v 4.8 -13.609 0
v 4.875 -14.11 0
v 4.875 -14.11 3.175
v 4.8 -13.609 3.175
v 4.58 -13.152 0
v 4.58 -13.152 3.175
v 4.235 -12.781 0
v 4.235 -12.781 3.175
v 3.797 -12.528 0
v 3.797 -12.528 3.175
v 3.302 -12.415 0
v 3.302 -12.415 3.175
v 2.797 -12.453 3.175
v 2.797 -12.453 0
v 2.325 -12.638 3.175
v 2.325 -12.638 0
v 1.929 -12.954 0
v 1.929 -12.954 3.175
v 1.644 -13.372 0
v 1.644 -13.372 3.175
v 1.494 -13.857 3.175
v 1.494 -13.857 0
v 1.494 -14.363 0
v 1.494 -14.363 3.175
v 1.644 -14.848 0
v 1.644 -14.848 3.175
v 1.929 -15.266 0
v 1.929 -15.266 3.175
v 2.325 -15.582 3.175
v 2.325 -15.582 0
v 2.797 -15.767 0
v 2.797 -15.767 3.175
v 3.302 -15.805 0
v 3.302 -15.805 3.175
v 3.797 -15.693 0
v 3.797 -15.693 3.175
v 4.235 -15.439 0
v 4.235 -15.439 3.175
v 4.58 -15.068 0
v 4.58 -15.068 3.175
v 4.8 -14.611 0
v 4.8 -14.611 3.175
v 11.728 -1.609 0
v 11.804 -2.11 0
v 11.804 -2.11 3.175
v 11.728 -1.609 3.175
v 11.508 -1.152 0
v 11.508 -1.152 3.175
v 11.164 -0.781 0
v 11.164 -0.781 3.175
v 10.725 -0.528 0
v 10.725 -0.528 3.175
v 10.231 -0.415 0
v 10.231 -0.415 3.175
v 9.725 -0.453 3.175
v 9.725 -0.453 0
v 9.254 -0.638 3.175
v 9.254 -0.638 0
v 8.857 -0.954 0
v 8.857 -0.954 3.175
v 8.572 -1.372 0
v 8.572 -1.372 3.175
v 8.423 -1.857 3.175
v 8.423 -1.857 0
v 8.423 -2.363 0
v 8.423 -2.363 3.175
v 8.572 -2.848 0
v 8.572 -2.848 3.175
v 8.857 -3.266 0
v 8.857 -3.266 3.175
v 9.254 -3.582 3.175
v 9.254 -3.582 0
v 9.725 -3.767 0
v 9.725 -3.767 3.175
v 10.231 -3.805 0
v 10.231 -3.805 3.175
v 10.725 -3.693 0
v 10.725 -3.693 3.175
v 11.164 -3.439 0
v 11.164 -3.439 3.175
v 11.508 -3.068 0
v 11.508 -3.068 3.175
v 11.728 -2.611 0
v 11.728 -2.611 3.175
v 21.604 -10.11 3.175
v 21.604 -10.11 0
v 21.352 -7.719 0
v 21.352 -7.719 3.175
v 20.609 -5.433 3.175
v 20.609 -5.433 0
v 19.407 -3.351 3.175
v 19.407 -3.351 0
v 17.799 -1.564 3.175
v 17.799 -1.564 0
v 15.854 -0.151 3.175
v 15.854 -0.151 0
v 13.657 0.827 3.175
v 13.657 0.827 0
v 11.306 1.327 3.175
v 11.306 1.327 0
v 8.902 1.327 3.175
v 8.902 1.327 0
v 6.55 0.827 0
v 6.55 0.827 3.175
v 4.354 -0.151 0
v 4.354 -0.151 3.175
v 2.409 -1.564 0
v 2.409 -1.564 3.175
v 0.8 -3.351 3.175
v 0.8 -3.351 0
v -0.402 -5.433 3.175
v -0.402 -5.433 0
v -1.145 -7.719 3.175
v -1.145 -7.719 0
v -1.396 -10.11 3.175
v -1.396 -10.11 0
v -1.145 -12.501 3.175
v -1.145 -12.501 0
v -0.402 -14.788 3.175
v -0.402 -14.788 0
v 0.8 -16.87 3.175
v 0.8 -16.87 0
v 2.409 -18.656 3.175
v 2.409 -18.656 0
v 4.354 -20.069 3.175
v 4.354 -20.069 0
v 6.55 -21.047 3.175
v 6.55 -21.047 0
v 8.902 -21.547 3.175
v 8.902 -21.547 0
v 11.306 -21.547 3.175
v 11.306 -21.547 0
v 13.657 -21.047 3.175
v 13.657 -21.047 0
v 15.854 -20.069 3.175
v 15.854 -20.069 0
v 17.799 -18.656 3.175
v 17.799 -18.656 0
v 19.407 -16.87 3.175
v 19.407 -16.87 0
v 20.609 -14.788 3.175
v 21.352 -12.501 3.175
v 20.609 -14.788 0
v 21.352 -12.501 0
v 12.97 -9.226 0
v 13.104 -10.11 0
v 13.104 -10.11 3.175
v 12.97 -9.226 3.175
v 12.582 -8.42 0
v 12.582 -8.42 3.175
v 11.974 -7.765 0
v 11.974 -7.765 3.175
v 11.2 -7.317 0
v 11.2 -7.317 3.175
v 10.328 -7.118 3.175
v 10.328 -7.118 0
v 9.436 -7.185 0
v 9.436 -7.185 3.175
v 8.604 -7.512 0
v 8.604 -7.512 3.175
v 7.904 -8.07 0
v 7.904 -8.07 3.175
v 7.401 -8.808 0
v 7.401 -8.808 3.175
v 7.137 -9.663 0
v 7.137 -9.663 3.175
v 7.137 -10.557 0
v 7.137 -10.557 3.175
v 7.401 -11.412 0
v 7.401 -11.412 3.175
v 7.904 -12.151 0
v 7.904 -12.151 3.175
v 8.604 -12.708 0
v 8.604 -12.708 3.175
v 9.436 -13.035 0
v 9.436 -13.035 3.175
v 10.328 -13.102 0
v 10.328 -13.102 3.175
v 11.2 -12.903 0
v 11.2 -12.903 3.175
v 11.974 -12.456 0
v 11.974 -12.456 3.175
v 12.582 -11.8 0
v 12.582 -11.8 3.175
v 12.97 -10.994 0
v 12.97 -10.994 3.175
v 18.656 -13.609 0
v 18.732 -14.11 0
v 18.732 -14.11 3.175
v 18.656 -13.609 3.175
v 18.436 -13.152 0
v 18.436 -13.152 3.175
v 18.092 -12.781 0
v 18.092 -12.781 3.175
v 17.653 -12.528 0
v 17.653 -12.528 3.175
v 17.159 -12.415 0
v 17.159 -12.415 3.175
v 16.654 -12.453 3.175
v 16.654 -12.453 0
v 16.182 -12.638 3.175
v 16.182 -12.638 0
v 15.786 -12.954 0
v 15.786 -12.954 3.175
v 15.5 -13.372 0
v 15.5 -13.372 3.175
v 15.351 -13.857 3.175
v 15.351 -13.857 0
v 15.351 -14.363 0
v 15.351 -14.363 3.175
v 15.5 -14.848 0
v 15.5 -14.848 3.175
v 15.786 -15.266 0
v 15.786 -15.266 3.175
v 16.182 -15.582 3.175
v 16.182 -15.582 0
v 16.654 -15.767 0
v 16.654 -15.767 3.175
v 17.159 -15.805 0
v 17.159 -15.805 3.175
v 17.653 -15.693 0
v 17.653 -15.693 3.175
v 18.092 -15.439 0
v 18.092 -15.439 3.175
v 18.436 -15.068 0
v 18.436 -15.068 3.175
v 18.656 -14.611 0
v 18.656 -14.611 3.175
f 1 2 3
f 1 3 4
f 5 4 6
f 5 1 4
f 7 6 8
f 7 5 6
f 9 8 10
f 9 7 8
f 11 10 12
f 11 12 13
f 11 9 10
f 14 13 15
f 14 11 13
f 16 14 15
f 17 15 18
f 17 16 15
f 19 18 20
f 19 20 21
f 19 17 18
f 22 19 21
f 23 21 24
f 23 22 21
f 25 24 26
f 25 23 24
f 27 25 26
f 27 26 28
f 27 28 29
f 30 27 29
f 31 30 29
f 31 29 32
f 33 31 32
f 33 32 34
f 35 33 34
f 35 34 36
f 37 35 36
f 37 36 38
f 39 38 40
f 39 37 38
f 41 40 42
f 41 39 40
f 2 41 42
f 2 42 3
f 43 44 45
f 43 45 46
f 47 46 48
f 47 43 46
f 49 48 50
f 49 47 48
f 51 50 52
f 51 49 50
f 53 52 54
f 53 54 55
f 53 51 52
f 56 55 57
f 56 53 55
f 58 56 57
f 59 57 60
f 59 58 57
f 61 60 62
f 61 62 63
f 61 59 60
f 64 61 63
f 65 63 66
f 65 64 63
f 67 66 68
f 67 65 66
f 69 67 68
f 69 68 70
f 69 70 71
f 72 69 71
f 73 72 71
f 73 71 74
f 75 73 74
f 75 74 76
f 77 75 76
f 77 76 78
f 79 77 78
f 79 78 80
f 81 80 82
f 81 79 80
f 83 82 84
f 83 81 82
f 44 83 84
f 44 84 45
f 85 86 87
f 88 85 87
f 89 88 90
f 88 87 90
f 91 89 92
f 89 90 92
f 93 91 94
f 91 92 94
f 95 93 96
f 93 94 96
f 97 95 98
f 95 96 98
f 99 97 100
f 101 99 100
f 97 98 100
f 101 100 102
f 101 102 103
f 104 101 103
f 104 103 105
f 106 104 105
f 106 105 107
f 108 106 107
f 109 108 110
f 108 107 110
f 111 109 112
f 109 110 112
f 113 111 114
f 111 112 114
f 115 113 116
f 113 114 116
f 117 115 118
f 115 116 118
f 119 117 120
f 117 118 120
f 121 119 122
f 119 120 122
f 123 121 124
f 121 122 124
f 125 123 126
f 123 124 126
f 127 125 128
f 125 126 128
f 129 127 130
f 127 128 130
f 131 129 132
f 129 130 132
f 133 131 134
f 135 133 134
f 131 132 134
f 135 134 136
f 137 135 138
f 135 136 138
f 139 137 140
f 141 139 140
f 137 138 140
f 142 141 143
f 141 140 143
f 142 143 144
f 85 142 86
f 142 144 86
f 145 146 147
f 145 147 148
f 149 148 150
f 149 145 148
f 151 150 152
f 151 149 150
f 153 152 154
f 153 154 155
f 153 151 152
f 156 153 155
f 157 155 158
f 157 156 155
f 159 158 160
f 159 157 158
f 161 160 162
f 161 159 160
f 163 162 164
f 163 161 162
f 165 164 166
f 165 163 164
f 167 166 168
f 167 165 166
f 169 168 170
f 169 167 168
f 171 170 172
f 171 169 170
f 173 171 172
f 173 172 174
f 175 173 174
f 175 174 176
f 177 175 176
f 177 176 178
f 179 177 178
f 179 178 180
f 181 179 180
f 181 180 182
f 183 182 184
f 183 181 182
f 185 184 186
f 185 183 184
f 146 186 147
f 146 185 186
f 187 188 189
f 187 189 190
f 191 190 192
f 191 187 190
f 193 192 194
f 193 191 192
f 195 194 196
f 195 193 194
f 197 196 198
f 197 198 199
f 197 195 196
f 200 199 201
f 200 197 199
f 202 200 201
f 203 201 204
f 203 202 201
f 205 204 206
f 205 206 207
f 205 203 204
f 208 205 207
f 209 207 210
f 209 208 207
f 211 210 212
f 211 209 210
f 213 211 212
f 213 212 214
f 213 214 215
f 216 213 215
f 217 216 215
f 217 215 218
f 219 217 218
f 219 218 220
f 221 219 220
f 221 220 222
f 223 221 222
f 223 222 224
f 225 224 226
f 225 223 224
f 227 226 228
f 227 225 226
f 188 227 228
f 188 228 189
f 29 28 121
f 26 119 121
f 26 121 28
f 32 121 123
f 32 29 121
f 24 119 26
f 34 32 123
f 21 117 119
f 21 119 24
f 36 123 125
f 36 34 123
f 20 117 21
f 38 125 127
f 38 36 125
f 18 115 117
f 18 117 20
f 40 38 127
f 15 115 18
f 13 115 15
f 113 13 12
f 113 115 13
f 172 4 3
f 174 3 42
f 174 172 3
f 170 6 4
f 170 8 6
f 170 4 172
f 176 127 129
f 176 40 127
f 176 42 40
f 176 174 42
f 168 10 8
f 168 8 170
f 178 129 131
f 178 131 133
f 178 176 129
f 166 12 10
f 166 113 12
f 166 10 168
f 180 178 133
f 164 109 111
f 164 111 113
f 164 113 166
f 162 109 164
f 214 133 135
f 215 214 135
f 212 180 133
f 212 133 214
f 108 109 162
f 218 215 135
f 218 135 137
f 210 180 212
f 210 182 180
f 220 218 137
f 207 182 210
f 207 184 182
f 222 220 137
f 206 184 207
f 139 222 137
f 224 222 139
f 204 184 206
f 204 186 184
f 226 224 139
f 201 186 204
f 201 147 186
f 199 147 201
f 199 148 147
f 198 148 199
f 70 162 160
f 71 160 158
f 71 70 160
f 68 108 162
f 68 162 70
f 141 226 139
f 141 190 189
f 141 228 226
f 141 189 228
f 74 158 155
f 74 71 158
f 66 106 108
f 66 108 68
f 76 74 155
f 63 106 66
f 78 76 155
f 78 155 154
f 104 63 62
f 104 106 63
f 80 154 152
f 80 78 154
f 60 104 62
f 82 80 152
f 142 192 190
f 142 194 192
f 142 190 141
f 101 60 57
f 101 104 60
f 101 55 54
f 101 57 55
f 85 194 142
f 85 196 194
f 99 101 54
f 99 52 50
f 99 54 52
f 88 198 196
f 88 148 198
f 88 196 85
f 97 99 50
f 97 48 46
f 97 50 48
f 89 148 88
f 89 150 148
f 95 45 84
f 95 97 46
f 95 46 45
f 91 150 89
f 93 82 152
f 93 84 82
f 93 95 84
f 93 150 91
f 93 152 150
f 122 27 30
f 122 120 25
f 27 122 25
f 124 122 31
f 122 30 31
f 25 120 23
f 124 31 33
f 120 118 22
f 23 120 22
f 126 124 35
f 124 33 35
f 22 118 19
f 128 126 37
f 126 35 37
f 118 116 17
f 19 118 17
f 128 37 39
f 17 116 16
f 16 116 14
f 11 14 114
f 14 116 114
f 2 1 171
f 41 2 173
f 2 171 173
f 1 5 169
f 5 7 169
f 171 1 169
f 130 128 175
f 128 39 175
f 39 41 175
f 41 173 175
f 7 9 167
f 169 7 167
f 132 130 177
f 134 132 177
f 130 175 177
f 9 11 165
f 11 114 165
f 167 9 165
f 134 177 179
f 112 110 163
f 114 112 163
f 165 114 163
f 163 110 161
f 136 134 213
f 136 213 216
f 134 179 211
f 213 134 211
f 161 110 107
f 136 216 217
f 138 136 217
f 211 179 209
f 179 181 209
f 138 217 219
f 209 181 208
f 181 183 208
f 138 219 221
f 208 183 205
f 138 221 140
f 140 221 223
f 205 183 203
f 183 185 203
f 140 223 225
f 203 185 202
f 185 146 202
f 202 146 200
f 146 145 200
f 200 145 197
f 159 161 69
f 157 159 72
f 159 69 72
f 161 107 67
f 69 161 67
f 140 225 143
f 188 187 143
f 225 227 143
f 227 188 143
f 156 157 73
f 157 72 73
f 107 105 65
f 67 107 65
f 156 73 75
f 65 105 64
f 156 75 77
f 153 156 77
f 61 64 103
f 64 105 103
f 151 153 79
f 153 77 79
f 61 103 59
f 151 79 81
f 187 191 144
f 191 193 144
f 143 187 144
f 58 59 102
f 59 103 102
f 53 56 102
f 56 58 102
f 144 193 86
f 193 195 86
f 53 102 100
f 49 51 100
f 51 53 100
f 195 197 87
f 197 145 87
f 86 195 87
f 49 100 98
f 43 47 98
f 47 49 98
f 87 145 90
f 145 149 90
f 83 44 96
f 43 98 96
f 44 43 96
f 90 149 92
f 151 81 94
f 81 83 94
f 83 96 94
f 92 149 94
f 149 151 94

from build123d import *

# Parameters (mm, degrees)
SKETCH1_R           = 11.5
SKETCH1_R_2         = 3
SKETCH1_R_3         = 1.7
BOSS_EXTRUDE1_DEPTH = 3.175


with BuildPart() as part:
    # Sketch1 → Boss-Extrude1 (new body)
    with BuildSketch(Plane.XY):
        with Locations((10.103629711, -10.110058712)):
            Circle(SKETCH1_R)
        with Locations((10.103629711, -10.110058712)):
            Circle(SKETCH1_R_2, mode=Mode.SUBTRACT)
        with Locations((3.175426481, -14.110058712)):
            Circle(SKETCH1_R_3, mode=Mode.SUBTRACT)
        with Locations((17.031832941, -14.110058712)):
            Circle(SKETCH1_R_3, mode=Mode.SUBTRACT)
        with Locations((10.103629711, -2.110058712)):
            Circle(SKETCH1_R_3, mode=Mode.SUBTRACT)
    extrude(amount=BOSS_EXTRUDE1_DEPTH)


solid = part.part
